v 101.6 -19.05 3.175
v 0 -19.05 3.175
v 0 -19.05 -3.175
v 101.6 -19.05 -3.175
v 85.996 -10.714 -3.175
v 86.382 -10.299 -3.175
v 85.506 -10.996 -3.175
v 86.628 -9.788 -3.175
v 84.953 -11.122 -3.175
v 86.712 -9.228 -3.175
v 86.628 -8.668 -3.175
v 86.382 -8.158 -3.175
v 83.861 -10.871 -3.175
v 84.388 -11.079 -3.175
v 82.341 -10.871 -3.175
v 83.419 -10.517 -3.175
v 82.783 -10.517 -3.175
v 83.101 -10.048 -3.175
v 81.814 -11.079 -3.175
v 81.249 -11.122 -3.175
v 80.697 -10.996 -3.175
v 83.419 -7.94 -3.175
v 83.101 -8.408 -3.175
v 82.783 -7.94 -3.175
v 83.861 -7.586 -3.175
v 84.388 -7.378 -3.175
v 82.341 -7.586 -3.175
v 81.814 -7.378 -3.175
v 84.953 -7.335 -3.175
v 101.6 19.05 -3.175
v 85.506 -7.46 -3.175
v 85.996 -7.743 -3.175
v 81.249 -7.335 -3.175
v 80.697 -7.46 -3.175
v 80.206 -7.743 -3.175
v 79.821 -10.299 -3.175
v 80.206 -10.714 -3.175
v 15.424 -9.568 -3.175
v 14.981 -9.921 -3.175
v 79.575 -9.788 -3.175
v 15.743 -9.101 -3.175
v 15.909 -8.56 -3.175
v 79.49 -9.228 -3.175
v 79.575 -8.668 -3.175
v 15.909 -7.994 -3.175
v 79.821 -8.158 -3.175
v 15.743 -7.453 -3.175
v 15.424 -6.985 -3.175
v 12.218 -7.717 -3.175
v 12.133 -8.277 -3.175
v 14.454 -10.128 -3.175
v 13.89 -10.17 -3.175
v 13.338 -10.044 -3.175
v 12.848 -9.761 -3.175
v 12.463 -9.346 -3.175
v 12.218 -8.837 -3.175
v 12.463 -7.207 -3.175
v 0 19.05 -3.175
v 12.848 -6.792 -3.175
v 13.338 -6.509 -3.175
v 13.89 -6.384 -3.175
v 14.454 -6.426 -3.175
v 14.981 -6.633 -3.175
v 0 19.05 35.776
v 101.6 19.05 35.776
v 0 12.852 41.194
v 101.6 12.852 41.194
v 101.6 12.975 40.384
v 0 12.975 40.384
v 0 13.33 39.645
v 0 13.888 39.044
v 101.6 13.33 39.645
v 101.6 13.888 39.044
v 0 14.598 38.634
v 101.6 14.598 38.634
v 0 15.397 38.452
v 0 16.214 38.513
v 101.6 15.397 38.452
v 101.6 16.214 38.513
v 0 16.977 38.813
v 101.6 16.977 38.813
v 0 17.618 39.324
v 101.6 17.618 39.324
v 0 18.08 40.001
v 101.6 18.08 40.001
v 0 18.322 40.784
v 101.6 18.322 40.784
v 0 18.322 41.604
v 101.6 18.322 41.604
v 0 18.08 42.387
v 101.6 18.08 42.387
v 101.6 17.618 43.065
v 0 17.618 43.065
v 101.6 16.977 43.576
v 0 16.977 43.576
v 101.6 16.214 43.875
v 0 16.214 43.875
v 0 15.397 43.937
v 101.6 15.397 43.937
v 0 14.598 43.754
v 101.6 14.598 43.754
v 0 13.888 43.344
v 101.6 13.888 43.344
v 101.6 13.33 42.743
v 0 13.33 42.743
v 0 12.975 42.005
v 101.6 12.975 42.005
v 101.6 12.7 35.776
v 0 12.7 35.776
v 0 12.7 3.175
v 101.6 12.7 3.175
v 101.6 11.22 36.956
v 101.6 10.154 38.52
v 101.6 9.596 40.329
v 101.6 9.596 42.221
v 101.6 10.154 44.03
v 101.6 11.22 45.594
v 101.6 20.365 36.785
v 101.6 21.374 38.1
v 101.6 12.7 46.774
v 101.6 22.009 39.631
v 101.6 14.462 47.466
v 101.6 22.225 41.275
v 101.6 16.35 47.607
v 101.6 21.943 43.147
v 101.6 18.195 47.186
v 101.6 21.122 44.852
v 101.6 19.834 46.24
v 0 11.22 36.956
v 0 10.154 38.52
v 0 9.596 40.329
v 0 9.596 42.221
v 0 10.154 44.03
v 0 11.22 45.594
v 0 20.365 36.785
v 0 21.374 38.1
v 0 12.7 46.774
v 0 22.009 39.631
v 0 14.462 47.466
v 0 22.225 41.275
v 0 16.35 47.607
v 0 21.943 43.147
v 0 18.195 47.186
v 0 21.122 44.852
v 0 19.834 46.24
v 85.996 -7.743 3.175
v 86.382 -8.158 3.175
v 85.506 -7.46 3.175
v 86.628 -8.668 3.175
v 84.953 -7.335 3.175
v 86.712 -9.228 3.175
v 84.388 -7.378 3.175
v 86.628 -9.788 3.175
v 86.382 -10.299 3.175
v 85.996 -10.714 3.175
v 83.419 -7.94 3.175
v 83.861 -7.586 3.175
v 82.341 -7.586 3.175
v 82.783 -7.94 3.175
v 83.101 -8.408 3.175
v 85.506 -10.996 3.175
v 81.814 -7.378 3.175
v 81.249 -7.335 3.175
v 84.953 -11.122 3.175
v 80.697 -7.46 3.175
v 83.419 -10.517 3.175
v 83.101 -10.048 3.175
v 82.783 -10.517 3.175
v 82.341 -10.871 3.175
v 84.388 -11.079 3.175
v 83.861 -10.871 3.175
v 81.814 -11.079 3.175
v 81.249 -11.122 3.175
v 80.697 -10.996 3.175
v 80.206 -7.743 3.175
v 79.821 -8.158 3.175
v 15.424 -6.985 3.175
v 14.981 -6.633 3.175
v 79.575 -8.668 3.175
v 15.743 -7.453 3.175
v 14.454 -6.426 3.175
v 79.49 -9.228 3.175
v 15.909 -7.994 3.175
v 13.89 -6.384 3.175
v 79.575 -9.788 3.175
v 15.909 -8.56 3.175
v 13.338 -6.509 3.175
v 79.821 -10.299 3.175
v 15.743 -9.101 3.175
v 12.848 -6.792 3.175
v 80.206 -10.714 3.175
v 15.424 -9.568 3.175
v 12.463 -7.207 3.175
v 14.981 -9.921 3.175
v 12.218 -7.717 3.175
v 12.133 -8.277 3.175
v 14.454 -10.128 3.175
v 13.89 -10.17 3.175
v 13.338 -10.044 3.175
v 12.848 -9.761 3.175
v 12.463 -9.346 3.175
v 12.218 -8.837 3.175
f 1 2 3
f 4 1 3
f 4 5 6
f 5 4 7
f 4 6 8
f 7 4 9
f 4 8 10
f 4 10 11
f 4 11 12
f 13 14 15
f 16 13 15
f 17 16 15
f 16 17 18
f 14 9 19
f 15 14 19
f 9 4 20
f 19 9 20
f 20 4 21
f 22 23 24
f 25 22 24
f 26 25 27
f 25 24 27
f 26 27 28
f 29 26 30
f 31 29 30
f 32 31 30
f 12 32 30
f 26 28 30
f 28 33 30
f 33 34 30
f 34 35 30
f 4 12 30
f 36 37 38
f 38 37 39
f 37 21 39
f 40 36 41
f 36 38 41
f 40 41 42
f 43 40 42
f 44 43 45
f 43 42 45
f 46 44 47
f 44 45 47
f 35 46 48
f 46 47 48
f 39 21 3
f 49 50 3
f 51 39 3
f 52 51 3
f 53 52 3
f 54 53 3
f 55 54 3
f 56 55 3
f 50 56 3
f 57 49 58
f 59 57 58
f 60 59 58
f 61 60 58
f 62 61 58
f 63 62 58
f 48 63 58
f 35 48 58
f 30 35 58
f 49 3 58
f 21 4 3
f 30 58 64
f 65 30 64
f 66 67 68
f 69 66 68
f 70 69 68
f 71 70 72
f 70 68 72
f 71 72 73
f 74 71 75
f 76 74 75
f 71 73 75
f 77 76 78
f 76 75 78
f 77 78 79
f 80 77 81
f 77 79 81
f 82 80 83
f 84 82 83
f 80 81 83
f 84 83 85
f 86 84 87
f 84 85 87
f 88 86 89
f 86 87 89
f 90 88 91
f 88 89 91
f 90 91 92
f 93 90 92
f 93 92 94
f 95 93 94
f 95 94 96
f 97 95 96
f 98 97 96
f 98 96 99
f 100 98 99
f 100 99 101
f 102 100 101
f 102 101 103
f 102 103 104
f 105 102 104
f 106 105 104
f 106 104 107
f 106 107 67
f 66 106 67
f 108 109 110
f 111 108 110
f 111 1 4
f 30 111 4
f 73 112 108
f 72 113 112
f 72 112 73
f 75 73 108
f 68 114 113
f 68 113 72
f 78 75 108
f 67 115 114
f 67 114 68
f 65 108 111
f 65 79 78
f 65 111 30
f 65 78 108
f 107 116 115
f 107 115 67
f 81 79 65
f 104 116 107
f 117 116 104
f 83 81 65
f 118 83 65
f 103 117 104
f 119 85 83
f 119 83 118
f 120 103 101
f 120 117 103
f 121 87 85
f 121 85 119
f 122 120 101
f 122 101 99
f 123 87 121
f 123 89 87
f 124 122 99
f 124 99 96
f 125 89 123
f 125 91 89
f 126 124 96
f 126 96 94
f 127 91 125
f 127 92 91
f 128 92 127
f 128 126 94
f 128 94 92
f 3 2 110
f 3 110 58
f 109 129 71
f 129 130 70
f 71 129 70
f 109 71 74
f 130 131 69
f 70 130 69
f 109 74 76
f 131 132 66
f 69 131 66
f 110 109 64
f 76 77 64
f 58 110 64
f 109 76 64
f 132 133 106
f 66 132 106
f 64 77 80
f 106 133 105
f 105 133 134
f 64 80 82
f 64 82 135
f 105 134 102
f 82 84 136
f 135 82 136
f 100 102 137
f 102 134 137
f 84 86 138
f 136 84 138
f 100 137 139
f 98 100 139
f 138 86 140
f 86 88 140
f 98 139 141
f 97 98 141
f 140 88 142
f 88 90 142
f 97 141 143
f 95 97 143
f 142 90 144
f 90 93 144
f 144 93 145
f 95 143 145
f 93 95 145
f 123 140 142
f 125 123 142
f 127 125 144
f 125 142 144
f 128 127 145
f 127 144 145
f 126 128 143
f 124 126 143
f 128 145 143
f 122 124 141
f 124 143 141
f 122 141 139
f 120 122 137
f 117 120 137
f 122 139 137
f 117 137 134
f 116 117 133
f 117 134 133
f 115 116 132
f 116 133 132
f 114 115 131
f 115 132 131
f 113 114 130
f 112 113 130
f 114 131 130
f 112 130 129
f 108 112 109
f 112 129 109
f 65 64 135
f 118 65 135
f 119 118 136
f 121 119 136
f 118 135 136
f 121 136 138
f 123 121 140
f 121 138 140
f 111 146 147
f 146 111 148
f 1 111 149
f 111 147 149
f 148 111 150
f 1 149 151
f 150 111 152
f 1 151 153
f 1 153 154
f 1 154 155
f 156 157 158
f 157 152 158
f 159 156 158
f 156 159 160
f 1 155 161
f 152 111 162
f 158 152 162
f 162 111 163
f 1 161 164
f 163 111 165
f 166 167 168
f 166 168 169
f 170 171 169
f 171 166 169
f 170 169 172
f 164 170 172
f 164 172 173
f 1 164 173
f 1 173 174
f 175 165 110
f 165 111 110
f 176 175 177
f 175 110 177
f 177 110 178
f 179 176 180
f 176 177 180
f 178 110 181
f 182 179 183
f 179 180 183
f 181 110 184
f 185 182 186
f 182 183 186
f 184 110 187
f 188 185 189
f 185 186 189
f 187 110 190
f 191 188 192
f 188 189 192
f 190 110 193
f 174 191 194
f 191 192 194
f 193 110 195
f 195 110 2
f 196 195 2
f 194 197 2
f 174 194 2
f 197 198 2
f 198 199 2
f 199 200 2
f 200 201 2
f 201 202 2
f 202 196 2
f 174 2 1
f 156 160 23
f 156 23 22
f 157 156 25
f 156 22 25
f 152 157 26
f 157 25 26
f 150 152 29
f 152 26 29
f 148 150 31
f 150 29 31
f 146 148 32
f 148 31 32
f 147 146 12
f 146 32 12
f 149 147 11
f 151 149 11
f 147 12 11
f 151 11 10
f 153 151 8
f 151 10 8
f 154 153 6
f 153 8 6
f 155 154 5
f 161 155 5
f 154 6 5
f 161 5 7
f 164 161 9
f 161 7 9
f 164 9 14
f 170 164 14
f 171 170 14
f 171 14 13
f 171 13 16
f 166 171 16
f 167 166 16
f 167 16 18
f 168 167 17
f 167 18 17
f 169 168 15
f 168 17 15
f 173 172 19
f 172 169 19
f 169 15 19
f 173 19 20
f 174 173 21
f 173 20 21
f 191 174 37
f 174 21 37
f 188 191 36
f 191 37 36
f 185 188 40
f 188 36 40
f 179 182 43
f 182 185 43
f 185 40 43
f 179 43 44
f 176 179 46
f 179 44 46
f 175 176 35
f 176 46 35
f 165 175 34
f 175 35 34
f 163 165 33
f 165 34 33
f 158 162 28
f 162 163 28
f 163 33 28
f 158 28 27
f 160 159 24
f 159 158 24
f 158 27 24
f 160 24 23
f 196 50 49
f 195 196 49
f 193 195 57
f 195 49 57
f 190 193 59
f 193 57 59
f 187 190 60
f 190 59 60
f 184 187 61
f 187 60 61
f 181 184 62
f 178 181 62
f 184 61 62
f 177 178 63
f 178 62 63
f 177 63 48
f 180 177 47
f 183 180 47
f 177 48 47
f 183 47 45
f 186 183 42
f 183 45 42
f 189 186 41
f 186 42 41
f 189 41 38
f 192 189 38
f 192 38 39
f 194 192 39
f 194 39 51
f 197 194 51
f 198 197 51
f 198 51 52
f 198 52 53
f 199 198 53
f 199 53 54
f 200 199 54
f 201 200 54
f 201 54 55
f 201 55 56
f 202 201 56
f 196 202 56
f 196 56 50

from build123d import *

# Parameters (mm, degrees)
F1_DEPTH = 101.6
F3_D     = 5.5
F5_D     = 3.7973


with BuildPart() as f1:
    # F0 (on Right) → F1 (new body)
    with BuildSketch(Plane.YZ):
        Polygon((-19.05, -3.175), (19.05, -3.175), (19.05, 3.175), (12.7, 3.175), (-19.05, 3.175), align=None)
        with BuildLine():
            Line((12.7, 3.175), (19.05, 3.175))
            Line((19.05, 3.175), (19.05, 35.775738686))
            ThreePointArc((19.05, 35.775738686), (15.875, 34.925), (12.7, 35.775738686))
            Line((12.7, 35.775738686), (12.7, 3.175))
        make_face()
        with BuildLine():
            ThreePointArc((12.7, 35.775738686), (15.875, 34.925), (19.05, 35.775738686))
            Line((19.05, 35.775738686), (19.05, 41.275))
            Line((19.05, 41.275), (12.7, 41.275))
            Line((12.7, 41.275), (12.7, 35.775738686))
        make_face()
        with BuildLine():
            Line((19.05, 41.275), (19.05, 35.775738686))
            ThreePointArc((19.05, 35.775738686), (21.374261314, 38.1), (22.225, 41.275))
            ThreePointArc((22.225, 41.275), (12.7, 46.774261314), (12.7, 35.775738686))
            Line((12.7, 35.775738686), (12.7, 41.275))
            Line((12.7, 41.275), (19.05, 41.275))
        make_face()
    extrude(amount=F1_DEPTH)

    # F3 (through all)
    with Locations(Plane(origin=(0, 0, 0), x_dir=(0, 1, 0), z_dir=(-1, 0, 0))):
        with Locations((15.6024256721, -41.1942079663)):
            Hole(F3_D / 2)

    # F5 (through all)
    with Locations(Plane.XY.offset(3.175)):
        with Locations((14.0319131315, -8.2768965513), (81.3887268305, -9.2282639816), (84.8136544228, -9.2282639816)):
            Hole(F5_D / 2)


solid = f1.part
